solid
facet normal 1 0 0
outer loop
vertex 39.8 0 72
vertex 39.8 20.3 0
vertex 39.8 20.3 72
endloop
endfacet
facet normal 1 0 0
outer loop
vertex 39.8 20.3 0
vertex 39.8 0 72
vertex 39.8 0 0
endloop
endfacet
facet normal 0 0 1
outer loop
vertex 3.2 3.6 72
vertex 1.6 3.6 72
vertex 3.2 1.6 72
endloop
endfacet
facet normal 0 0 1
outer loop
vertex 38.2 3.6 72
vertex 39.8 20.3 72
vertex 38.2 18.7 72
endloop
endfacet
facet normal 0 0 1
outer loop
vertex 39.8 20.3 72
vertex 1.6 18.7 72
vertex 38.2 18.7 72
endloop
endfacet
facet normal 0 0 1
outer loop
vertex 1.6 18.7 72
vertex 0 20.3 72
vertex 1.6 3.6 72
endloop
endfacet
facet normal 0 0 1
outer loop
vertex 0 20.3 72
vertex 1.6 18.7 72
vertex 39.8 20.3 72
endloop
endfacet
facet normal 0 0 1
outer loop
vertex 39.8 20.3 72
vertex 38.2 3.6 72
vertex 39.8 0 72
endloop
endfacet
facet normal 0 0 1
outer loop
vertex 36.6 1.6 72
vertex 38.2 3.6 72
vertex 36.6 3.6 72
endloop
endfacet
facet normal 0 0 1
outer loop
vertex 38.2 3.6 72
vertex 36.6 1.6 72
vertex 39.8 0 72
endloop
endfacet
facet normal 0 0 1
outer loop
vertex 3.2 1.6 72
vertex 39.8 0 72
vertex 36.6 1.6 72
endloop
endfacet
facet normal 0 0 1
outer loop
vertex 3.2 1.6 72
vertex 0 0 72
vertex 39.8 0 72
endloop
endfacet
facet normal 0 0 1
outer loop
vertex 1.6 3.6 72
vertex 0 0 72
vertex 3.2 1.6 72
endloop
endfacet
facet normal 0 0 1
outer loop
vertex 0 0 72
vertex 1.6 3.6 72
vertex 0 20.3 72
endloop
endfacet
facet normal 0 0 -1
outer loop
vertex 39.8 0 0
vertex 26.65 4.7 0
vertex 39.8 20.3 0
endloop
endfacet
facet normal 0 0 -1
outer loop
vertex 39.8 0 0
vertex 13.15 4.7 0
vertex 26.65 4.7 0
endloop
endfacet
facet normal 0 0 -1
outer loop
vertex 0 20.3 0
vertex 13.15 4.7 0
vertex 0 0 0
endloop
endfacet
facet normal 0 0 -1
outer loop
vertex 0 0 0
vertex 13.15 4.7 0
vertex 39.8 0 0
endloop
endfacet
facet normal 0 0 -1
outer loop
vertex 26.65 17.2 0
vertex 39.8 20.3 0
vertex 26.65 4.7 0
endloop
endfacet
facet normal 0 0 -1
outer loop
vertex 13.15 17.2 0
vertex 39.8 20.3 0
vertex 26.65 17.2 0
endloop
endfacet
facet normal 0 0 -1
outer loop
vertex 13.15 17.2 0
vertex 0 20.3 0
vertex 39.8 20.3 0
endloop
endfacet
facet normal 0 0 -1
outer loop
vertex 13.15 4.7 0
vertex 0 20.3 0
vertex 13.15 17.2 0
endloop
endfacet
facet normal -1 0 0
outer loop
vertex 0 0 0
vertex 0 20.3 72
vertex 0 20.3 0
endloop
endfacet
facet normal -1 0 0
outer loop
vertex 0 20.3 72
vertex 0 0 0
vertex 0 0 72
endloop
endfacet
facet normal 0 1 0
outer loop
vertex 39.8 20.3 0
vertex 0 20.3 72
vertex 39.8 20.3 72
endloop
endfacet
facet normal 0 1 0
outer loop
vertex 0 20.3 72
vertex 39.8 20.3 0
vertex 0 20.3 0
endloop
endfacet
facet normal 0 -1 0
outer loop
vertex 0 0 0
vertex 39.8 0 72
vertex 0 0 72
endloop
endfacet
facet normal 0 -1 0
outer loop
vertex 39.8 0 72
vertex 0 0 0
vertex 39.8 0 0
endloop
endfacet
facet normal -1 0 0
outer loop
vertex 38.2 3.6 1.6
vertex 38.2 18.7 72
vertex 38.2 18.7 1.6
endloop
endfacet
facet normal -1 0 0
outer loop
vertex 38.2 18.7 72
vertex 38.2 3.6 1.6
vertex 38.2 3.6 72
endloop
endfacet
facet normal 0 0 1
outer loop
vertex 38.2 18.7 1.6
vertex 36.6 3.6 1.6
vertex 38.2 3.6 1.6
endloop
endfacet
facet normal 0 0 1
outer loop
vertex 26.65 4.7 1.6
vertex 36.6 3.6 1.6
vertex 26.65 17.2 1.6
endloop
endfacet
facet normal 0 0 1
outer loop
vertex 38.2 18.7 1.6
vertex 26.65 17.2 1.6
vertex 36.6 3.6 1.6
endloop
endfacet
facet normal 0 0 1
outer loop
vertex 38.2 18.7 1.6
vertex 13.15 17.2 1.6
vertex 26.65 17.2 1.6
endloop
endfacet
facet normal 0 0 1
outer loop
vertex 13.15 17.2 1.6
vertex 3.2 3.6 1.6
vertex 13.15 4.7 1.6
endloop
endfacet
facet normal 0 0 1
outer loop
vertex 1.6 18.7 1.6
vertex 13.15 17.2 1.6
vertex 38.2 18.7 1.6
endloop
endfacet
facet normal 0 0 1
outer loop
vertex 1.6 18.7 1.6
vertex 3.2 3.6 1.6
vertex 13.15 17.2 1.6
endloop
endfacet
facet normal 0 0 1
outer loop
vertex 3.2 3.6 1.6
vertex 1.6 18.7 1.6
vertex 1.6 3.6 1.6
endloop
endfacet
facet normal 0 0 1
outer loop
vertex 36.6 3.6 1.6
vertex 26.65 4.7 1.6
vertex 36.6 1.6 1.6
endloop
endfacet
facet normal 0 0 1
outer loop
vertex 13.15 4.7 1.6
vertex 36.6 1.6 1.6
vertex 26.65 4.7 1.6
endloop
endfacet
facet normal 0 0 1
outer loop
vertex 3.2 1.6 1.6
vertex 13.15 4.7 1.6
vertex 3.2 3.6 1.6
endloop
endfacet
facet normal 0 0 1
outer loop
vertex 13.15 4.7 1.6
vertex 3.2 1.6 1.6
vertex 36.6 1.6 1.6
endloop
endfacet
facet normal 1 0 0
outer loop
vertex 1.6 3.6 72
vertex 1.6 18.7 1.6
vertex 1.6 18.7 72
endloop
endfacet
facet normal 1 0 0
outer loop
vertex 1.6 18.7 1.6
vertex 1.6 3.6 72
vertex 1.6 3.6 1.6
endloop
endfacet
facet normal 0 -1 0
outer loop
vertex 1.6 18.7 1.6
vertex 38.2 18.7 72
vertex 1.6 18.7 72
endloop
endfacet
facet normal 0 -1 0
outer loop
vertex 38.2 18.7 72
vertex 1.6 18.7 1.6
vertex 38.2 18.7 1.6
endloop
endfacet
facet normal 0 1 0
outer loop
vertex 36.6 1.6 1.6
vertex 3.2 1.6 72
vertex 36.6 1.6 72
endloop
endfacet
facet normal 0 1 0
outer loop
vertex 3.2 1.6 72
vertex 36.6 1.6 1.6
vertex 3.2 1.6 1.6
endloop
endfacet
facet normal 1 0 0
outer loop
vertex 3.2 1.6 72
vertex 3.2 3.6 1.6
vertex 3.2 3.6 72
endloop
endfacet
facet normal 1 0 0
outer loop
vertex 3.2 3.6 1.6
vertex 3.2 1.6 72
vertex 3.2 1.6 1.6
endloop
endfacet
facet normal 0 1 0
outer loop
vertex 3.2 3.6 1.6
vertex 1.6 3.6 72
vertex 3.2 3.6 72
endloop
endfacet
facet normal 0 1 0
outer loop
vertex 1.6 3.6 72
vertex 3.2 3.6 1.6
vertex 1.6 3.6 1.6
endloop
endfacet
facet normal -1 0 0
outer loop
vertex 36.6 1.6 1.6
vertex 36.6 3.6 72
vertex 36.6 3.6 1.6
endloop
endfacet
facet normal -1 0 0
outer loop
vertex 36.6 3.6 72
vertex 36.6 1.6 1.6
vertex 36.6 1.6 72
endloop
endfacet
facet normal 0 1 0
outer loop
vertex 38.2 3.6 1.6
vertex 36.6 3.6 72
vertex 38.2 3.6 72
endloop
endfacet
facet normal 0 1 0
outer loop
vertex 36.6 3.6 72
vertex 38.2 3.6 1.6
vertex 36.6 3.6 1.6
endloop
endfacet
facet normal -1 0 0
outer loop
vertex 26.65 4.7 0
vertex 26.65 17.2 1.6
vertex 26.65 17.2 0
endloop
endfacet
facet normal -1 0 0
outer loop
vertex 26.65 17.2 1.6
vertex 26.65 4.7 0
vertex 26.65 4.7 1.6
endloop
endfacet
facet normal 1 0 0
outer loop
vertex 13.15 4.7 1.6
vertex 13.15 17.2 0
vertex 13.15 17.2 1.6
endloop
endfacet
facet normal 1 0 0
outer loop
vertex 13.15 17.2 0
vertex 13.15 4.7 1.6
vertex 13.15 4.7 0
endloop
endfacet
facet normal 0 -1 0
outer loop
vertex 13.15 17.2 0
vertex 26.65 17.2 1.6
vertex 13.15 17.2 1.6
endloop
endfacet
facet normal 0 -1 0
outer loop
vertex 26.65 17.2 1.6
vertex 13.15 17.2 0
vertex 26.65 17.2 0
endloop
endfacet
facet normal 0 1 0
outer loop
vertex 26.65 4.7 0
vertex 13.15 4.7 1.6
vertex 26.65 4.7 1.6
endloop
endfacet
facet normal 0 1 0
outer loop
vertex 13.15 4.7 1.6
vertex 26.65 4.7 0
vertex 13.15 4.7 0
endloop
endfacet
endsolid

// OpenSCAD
// file: dimensions.scad
// Shared dimensions for the case, lid, and assembly preview.

// PCB dimensions.
pcb_length = 65; // USB edge to DB9 edge; confirmed
pcb_width = 35;  // confirmed
pcb_thickness = 1.6;
width_clearance = 0.8;

// Cross-section viewed from the USB end.
underboard_clearance = 2;
component_height = 13; // estimated PCB top to tallest component
component_clearance = 0.5;

// Case dimensions. A 1.6 mm wall is four lines with a 0.4 mm nozzle.
wall = 1.6;
bottom_thickness = 1.6;
top_clearance = 0.5;

// Distance the USB-B shell extends beyond the PCB edge.
usb_projection = 6.5;

// USB-B opening in the closed bottom, viewed from the connector end.
usb_opening_width = 13.5;
usb_opening_depth = 12.5;
usb_opening_below_pcb_top = 0.5;

// Side ribs overlap only this much of each PCB edge.
guide_contact_width = 0.8;

// Flat DB9-end lid. The connector measurements are initial estimates and are
// intentionally kept here for easy adjustment after a fit test.
lid_thickness = 1.6;
db9_body_width = 31;
db9_body_depth = 13;
db9_fit_clearance = 0.25;
db9_opening_below_pcb_top = 0.5;

epsilon = 0.01;

inner_width = pcb_width + 2 * width_clearance;
inner_depth = underboard_clearance
    + pcb_thickness
    + component_height
    + component_clearance;
outer_width = inner_width + 2 * wall;
outer_depth = inner_depth + 2 * wall;
case_height = usb_projection + pcb_length + top_clearance;

pcb_x = wall + width_clearance;
pcb_y = wall + underboard_clearance;
pcb_top_y = pcb_y + pcb_thickness;

db9_opening_width = db9_body_width + 2 * db9_fit_clearance;
db9_opening_depth = db9_body_depth + 2 * db9_fit_clearance;
db9_opening_x = (outer_width - db9_opening_width) / 2;
db9_opening_y = pcb_top_y
    - db9_opening_below_pcb_top
    - db9_fit_clearance;
// main file
// Vertical, open-ended case for the DIYMORE FT232BM/BL USB serial adapter.
// The USB end is the print bed; the DB9 end is the open top.
// All dimensions are in millimetres.

include <dimensions.scad>

module guide_ribs() {
    for (x = [wall, pcb_x + pcb_width - guide_contact_width])
        translate([x, wall, bottom_thickness])
            cube([
                width_clearance + guide_contact_width,
                underboard_clearance,
                case_height - bottom_thickness
            ]);
}

module case() {
    difference() {
        union() {
            difference() {
                cube([outer_width, outer_depth, case_height]);

                // The cavity continues through the DB9 end, making that end
                // the completely open mouth of the well.
                translate([wall, wall, bottom_thickness])
                    cube([inner_width, inner_depth, case_height]);
            }
            guide_ribs();
        }

        // USB-B opening through the closed bottom face.
        translate([
            pcb_x + (pcb_width - usb_opening_width) / 2,
            pcb_top_y - usb_opening_below_pcb_top,
            -epsilon
        ])
            cube([
                usb_opening_width,
                usb_opening_depth,
                bottom_thickness + 2 * epsilon
            ]);
    }
}

case();
